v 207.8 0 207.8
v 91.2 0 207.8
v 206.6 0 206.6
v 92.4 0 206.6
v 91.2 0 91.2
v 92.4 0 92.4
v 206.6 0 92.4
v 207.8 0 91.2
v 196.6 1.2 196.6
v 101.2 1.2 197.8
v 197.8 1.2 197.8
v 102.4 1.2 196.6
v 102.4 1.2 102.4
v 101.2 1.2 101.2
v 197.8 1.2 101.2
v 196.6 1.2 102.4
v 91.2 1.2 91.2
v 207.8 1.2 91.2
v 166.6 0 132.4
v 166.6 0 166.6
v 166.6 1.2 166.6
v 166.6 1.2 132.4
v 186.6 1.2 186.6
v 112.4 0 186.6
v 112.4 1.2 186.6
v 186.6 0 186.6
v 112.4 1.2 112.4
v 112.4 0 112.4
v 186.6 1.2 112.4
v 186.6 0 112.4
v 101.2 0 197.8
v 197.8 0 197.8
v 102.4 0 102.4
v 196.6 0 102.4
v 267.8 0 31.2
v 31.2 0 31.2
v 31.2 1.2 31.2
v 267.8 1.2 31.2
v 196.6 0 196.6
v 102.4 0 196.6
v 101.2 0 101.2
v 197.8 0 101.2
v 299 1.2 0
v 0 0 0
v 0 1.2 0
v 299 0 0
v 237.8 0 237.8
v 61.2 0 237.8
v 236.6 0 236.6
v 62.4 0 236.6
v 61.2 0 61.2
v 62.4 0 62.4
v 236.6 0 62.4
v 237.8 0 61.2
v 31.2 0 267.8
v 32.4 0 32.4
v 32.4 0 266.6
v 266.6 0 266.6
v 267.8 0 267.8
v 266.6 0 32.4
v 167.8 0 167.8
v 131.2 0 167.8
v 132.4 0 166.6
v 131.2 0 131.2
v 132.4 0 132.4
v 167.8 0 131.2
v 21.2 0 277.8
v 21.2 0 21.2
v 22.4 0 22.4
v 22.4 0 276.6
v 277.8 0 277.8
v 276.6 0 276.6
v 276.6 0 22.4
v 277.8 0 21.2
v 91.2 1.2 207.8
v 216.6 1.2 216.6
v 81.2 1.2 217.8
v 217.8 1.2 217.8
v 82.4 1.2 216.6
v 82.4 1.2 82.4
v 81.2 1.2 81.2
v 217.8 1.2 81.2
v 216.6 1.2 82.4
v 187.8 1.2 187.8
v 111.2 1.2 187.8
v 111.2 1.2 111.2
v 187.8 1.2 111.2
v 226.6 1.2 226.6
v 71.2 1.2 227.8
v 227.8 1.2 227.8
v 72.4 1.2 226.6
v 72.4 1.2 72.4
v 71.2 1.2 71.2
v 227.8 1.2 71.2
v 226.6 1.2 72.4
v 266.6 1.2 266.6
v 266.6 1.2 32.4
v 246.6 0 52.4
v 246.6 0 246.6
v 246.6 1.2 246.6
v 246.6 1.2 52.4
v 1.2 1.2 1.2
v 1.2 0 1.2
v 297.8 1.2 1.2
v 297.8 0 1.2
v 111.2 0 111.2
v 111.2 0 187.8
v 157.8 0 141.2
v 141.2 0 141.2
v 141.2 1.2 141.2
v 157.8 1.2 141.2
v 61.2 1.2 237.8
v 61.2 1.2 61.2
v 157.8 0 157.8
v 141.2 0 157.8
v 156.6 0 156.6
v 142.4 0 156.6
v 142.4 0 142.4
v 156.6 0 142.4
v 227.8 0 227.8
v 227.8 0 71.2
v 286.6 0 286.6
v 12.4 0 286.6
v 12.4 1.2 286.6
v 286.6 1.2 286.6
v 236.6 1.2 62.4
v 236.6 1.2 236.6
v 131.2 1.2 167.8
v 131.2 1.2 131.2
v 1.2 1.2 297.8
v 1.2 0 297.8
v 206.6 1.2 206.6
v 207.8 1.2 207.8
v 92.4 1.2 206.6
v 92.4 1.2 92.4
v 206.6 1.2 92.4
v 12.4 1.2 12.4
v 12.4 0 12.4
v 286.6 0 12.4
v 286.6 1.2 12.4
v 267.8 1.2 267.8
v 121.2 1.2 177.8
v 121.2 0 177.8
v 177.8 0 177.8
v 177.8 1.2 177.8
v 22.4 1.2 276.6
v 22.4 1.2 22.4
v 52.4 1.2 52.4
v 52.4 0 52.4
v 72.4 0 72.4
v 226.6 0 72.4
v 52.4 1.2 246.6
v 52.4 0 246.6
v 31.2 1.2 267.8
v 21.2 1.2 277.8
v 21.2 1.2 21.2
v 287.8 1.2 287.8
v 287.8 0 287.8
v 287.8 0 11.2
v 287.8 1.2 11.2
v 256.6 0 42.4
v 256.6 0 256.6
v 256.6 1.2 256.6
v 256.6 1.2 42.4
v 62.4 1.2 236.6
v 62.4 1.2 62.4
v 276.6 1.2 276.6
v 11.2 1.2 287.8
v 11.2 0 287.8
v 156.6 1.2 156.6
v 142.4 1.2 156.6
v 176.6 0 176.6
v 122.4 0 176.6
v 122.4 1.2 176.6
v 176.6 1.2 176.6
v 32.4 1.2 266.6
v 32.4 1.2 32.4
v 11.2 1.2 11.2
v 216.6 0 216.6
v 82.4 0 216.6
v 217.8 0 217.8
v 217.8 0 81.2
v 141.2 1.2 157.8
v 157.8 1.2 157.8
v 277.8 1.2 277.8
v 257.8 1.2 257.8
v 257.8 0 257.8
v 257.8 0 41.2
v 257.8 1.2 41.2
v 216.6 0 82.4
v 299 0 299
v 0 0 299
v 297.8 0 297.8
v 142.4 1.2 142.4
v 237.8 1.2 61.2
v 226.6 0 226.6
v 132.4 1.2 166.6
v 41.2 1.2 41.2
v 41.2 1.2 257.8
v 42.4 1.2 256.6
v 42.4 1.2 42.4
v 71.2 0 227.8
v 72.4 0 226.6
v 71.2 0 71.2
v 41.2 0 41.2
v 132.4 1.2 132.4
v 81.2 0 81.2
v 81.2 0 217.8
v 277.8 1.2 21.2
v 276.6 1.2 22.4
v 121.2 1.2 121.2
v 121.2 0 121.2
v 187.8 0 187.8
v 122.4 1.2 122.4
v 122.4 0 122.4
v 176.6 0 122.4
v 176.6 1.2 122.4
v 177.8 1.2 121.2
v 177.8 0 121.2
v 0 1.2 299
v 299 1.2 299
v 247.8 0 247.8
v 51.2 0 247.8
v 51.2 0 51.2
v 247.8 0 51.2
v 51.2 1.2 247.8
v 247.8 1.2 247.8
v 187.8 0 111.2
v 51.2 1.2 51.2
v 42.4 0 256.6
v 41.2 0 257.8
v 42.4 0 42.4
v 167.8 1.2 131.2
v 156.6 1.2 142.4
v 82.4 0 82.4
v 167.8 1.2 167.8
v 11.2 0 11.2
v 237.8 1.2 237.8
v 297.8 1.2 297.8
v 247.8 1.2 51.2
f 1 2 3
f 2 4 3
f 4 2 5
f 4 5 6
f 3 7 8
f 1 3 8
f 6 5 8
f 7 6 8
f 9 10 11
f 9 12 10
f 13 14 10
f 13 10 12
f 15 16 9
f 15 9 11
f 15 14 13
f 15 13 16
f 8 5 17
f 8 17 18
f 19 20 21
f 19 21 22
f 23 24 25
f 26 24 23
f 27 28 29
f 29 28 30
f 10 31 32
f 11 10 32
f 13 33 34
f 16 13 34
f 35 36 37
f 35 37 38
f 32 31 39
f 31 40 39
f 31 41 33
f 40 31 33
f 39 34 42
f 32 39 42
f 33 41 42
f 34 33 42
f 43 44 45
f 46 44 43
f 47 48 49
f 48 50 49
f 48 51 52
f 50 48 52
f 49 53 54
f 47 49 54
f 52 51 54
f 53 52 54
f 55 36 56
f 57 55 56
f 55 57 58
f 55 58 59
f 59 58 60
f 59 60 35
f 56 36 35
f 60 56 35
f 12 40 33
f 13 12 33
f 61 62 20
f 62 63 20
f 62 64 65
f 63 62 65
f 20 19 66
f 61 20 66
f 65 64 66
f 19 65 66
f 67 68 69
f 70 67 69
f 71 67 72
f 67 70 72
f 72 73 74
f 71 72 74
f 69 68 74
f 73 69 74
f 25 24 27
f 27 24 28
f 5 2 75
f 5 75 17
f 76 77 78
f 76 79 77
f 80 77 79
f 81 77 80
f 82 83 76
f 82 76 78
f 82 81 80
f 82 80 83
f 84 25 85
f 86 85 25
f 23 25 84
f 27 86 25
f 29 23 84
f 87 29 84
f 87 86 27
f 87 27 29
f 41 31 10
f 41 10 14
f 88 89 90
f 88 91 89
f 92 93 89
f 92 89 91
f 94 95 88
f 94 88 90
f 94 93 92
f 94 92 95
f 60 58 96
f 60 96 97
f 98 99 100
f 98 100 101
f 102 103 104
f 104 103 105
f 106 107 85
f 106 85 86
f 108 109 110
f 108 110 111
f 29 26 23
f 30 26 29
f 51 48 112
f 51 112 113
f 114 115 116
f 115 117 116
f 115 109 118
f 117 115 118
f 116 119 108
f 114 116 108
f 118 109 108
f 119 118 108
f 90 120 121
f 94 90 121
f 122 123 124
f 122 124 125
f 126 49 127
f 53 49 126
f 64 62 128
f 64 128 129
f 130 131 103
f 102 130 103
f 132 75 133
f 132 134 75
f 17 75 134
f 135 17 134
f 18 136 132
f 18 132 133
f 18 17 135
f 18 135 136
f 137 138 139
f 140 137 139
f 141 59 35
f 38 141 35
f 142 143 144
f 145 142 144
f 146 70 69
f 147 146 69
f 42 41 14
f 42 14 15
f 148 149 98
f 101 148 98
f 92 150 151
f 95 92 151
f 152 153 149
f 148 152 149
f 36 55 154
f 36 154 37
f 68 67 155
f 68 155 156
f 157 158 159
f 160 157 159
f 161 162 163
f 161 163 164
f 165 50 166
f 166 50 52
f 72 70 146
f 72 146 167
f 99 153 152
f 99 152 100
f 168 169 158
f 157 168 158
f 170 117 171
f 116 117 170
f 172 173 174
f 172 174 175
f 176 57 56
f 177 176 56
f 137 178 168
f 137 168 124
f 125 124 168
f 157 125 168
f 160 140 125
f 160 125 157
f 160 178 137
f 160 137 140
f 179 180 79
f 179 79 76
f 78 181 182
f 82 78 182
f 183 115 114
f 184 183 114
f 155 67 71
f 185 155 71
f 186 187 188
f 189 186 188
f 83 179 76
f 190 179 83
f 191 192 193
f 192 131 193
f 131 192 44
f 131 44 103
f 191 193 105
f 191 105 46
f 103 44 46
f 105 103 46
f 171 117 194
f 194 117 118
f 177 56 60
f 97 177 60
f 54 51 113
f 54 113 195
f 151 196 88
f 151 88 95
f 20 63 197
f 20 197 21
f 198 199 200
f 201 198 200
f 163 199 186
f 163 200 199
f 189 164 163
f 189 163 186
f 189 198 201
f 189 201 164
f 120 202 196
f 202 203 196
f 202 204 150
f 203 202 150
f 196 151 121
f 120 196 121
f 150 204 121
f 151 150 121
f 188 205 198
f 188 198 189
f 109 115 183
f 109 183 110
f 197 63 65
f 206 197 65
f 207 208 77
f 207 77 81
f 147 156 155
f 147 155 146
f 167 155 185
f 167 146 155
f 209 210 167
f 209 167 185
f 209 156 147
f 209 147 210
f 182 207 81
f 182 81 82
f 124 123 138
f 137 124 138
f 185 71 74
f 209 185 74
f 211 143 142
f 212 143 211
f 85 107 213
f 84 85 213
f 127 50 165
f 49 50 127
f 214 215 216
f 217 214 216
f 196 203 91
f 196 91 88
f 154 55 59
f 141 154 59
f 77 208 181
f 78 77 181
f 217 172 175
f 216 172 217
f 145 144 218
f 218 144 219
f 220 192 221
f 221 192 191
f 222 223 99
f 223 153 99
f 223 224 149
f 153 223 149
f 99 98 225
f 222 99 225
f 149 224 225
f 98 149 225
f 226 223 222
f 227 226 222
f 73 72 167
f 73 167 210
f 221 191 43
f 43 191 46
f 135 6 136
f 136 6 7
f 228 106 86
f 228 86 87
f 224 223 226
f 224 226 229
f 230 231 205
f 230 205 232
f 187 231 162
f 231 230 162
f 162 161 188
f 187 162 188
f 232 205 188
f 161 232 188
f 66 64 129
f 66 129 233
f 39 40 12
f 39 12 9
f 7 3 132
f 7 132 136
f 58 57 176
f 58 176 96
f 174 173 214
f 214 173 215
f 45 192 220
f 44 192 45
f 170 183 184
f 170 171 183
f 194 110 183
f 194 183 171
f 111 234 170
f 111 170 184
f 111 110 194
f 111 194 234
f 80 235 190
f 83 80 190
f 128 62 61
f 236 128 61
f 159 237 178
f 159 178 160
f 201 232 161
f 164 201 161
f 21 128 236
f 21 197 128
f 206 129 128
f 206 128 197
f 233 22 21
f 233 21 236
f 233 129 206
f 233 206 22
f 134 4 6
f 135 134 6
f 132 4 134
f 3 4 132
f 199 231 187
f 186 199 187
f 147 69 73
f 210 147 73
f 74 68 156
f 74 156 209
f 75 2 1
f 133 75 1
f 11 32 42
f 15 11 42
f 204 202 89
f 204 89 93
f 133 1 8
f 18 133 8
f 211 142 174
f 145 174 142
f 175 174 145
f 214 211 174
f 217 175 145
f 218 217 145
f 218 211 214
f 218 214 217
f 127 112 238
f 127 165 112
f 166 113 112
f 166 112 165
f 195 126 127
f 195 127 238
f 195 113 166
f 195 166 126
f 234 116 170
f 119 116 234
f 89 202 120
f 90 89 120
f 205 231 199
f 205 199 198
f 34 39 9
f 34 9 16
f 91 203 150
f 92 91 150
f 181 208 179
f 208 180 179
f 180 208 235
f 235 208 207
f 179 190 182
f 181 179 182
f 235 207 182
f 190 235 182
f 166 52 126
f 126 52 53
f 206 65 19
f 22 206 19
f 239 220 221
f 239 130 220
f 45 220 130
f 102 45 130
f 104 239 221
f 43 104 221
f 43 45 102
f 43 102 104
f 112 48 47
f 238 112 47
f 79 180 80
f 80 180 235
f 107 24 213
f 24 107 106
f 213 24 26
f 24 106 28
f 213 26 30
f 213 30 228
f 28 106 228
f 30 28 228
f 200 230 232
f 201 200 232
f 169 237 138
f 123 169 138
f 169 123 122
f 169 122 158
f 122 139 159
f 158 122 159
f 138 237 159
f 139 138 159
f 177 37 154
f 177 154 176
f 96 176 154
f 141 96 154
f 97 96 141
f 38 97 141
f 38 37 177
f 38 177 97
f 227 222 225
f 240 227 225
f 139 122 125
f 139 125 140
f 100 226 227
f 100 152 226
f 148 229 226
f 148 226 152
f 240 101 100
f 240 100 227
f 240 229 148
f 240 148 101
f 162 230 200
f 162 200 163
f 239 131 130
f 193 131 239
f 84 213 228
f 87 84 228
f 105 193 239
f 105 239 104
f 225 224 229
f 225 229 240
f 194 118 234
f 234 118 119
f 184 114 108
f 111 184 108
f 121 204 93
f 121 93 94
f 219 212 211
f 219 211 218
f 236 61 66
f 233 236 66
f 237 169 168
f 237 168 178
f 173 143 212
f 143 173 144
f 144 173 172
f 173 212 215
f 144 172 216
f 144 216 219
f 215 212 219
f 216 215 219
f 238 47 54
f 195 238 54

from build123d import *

# Parameters (mm, degrees)
SKETCH1_W              = 299
SKETCH1_H              = 299
SKETCH1_W_2            = 296.6
SKETCH1_H_2            = 296.6
BOSS_EXTRUDE2_DEPTH    = 1.2
SKETCH1_W_3            = 276.6
SKETCH1_H_3            = 276.6
SKETCH1_W_4            = 274.2
SKETCH1_H_4            = 274.2
BOSS_EXTRUDE2_2_DEPTH  = 1.2
SKETCH1_W_5            = 256.6
SKETCH1_H_5            = 256.6
SKETCH1_W_6            = 254.2
SKETCH1_H_6            = 254.2
BOSS_EXTRUDE2_3_DEPTH  = 1.2
SKETCH1_W_7            = 236.6
SKETCH1_H_7            = 236.6
SKETCH1_W_8            = 234.2
SKETCH1_H_8            = 234.2
BOSS_EXTRUDE2_4_DEPTH  = 1.2
SKETCH1_W_9            = 216.6
SKETCH1_H_9            = 216.6
SKETCH1_W_10           = 214.2
SKETCH1_H_10           = 214.2
BOSS_EXTRUDE2_5_DEPTH  = 1.2
SKETCH1_W_11           = 196.6
SKETCH1_H_11           = 196.6
SKETCH1_W_12           = 194.2
SKETCH1_H_12           = 194.2
BOSS_EXTRUDE2_6_DEPTH  = 1.2
SKETCH1_W_13           = 176.6
SKETCH1_H_13           = 176.6
SKETCH1_W_14           = 174.2
SKETCH1_H_14           = 174.2
BOSS_EXTRUDE2_7_DEPTH  = 1.2
SKETCH1_W_15           = 156.6
SKETCH1_H_15           = 156.6
SKETCH1_W_16           = 154.2
SKETCH1_H_16           = 154.2
BOSS_EXTRUDE2_8_DEPTH  = 1.2
SKETCH1_W_17           = 136.6
SKETCH1_H_17           = 136.6
SKETCH1_W_18           = 134.2
SKETCH1_H_18           = 134.2
BOSS_EXTRUDE2_9_DEPTH  = 1.2
SKETCH1_W_19           = 116.6
SKETCH1_H_19           = 116.6
SKETCH1_W_20           = 114.2
SKETCH1_H_20           = 114.2
BOSS_EXTRUDE2_10_DEPTH = 1.2
SKETCH1_W_21           = 96.6
SKETCH1_H_21           = 96.6
SKETCH1_W_22           = 94.2
SKETCH1_H_22           = 94.2
BOSS_EXTRUDE2_11_DEPTH = 1.2
SKETCH1_W_23           = 76.6
SKETCH1_H_23           = 76.6
SKETCH1_W_24           = 74.2
SKETCH1_H_24           = 74.2
BOSS_EXTRUDE2_12_DEPTH = 1.2
SKETCH1_W_25           = 56.6
SKETCH1_H_25           = 56.6
SKETCH1_W_26           = 54.2
SKETCH1_H_26           = 54.2
BOSS_EXTRUDE2_13_DEPTH = 1.2
SKETCH1_W_27           = 36.6
SKETCH1_H_27           = 36.6
SKETCH1_W_28           = 34.2
SKETCH1_H_28           = 34.2
BOSS_EXTRUDE2_14_DEPTH = 1.2
SKETCH1_W_29           = 16.6
SKETCH1_H_29           = 16.6
SKETCH1_W_30           = 14.2
SKETCH1_H_30           = 14.2
BOSS_EXTRUDE2_15_DEPTH = 1.2


with BuildPart() as part:
    # Sketch1 → Boss-Extrude2 (new body)
    with BuildSketch(Plane(origin=(0, 0, 0), x_dir=(1, 0, 0), z_dir=(0, 1, 0))):
        with Locations((149.5, -149.5)):
            Rectangle(SKETCH1_W, SKETCH1_H)
        with Locations((149.5, -149.5)):
            Rectangle(SKETCH1_W_2, SKETCH1_H_2, mode=Mode.SUBTRACT)
    extrude(amount=BOSS_EXTRUDE2_DEPTH)


with BuildPart() as body_2:
    # Sketch1 → Boss-Extrude2 2 (new body)
    with BuildSketch(Plane(origin=(0, 0, 0), x_dir=(1, 0, 0), z_dir=(0, 1, 0))):
        with Locations((149.5, -149.5)):
            Rectangle(SKETCH1_W_3, SKETCH1_H_3)
        with Locations((149.5, -149.5)):
            Rectangle(SKETCH1_W_4, SKETCH1_H_4, mode=Mode.SUBTRACT)
    extrude(amount=BOSS_EXTRUDE2_2_DEPTH)


with BuildPart() as body_3:
    # Sketch1 → Boss-Extrude2 3 (new body)
    with BuildSketch(Plane(origin=(0, 0, 0), x_dir=(1, 0, 0), z_dir=(0, 1, 0))):
        with Locations((149.5, -149.5)):
            Rectangle(SKETCH1_W_5, SKETCH1_H_5)
        with Locations((149.5, -149.5)):
            Rectangle(SKETCH1_W_6, SKETCH1_H_6, mode=Mode.SUBTRACT)
    extrude(amount=BOSS_EXTRUDE2_3_DEPTH)


with BuildPart() as body_4:
    # Sketch1 → Boss-Extrude2 4 (new body)
    with BuildSketch(Plane(origin=(0, 0, 0), x_dir=(1, 0, 0), z_dir=(0, 1, 0))):
        with Locations((149.5, -149.5)):
            Rectangle(SKETCH1_W_7, SKETCH1_H_7)
        with Locations((149.5, -149.5)):
            Rectangle(SKETCH1_W_8, SKETCH1_H_8, mode=Mode.SUBTRACT)
    extrude(amount=BOSS_EXTRUDE2_4_DEPTH)


with BuildPart() as body_5:
    # Sketch1 → Boss-Extrude2 5 (new body)
    with BuildSketch(Plane(origin=(0, 0, 0), x_dir=(1, 0, 0), z_dir=(0, 1, 0))):
        with Locations((149.5, -149.5)):
            Rectangle(SKETCH1_W_9, SKETCH1_H_9)
        with Locations((149.5, -149.5)):
            Rectangle(SKETCH1_W_10, SKETCH1_H_10, mode=Mode.SUBTRACT)
    extrude(amount=BOSS_EXTRUDE2_5_DEPTH)


with BuildPart() as body_6:
    # Sketch1 → Boss-Extrude2 6 (new body)
    with BuildSketch(Plane(origin=(0, 0, 0), x_dir=(1, 0, 0), z_dir=(0, 1, 0))):
        with Locations((149.5, -149.5)):
            Rectangle(SKETCH1_W_11, SKETCH1_H_11)
        with Locations((149.5, -149.5)):
            Rectangle(SKETCH1_W_12, SKETCH1_H_12, mode=Mode.SUBTRACT)
    extrude(amount=BOSS_EXTRUDE2_6_DEPTH)


with BuildPart() as body_7:
    # Sketch1 → Boss-Extrude2 7 (new body)
    with BuildSketch(Plane(origin=(0, 0, 0), x_dir=(1, 0, 0), z_dir=(0, 1, 0))):
        with Locations((149.5, -149.5)):
            Rectangle(SKETCH1_W_13, SKETCH1_H_13)
        with Locations((149.5, -149.5)):
            Rectangle(SKETCH1_W_14, SKETCH1_H_14, mode=Mode.SUBTRACT)
    extrude(amount=BOSS_EXTRUDE2_7_DEPTH)


with BuildPart() as body_8:
    # Sketch1 → Boss-Extrude2 8 (new body)
    with BuildSketch(Plane(origin=(0, 0, 0), x_dir=(1, 0, 0), z_dir=(0, 1, 0))):
        with Locations((149.5, -149.5)):
            Rectangle(SKETCH1_W_15, SKETCH1_H_15)
        with Locations((149.5, -149.5)):
            Rectangle(SKETCH1_W_16, SKETCH1_H_16, mode=Mode.SUBTRACT)
    extrude(amount=BOSS_EXTRUDE2_8_DEPTH)


with BuildPart() as body_9:
    # Sketch1 → Boss-Extrude2 9 (new body)
    with BuildSketch(Plane(origin=(0, 0, 0), x_dir=(1, 0, 0), z_dir=(0, 1, 0))):
        with Locations((149.5, -149.5)):
            Rectangle(SKETCH1_W_17, SKETCH1_H_17)
        with Locations((149.5, -149.5)):
            Rectangle(SKETCH1_W_18, SKETCH1_H_18, mode=Mode.SUBTRACT)
    extrude(amount=BOSS_EXTRUDE2_9_DEPTH)


with BuildPart() as body_10:
    # Sketch1 → Boss-Extrude2 10 (new body)
    with BuildSketch(Plane(origin=(0, 0, 0), x_dir=(1, 0, 0), z_dir=(0, 1, 0))):
        with Locations((149.5, -149.5)):
            Rectangle(SKETCH1_W_19, SKETCH1_H_19)
        with Locations((149.5, -149.5)):
            Rectangle(SKETCH1_W_20, SKETCH1_H_20, mode=Mode.SUBTRACT)
    extrude(amount=BOSS_EXTRUDE2_10_DEPTH)


with BuildPart() as body_11:
    # Sketch1 → Boss-Extrude2 11 (new body)
    with BuildSketch(Plane(origin=(0, 0, 0), x_dir=(1, 0, 0), z_dir=(0, 1, 0))):
        with Locations((149.5, -149.5)):
            Rectangle(SKETCH1_W_21, SKETCH1_H_21)
        with Locations((149.5, -149.5)):
            Rectangle(SKETCH1_W_22, SKETCH1_H_22, mode=Mode.SUBTRACT)
    extrude(amount=BOSS_EXTRUDE2_11_DEPTH)


with BuildPart() as body_12:
    # Sketch1 → Boss-Extrude2 12 (new body)
    with BuildSketch(Plane(origin=(0, 0, 0), x_dir=(1, 0, 0), z_dir=(0, 1, 0))):
        with Locations((149.5, -149.5)):
            Rectangle(SKETCH1_W_23, SKETCH1_H_23)
        with Locations((149.5, -149.5)):
            Rectangle(SKETCH1_W_24, SKETCH1_H_24, mode=Mode.SUBTRACT)
    extrude(amount=BOSS_EXTRUDE2_12_DEPTH)


with BuildPart() as body_13:
    # Sketch1 → Boss-Extrude2 13 (new body)
    with BuildSketch(Plane(origin=(0, 0, 0), x_dir=(1, 0, 0), z_dir=(0, 1, 0))):
        with Locations((149.5, -149.5)):
            Rectangle(SKETCH1_W_25, SKETCH1_H_25)
        with Locations((149.5, -149.5)):
            Rectangle(SKETCH1_W_26, SKETCH1_H_26, mode=Mode.SUBTRACT)
    extrude(amount=BOSS_EXTRUDE2_13_DEPTH)


with BuildPart() as body_14:
    # Sketch1 → Boss-Extrude2 14 (new body)
    with BuildSketch(Plane(origin=(0, 0, 0), x_dir=(1, 0, 0), z_dir=(0, 1, 0))):
        with Locations((149.5, -149.5)):
            Rectangle(SKETCH1_W_27, SKETCH1_H_27)
        with Locations((149.5, -149.5)):
            Rectangle(SKETCH1_W_28, SKETCH1_H_28, mode=Mode.SUBTRACT)
    extrude(amount=BOSS_EXTRUDE2_14_DEPTH)


with BuildPart() as body_15:
    # Sketch1 → Boss-Extrude2 15 (new body)
    with BuildSketch(Plane(origin=(0, 0, 0), x_dir=(1, 0, 0), z_dir=(0, 1, 0))):
        with Locations((149.5, -149.5)):
            Rectangle(SKETCH1_W_29, SKETCH1_H_29)
        with Locations((149.5, -149.5)):
            Rectangle(SKETCH1_W_30, SKETCH1_H_30, mode=Mode.SUBTRACT)
    extrude(amount=BOSS_EXTRUDE2_15_DEPTH)


solid = Compound([part.part, body_2.part, body_3.part, body_4.part, body_5.part, body_6.part, body_7.part, body_8.part, body_9.part, body_10.part, body_11.part, body_12.part, body_13.part, body_14.part, body_15.part])
